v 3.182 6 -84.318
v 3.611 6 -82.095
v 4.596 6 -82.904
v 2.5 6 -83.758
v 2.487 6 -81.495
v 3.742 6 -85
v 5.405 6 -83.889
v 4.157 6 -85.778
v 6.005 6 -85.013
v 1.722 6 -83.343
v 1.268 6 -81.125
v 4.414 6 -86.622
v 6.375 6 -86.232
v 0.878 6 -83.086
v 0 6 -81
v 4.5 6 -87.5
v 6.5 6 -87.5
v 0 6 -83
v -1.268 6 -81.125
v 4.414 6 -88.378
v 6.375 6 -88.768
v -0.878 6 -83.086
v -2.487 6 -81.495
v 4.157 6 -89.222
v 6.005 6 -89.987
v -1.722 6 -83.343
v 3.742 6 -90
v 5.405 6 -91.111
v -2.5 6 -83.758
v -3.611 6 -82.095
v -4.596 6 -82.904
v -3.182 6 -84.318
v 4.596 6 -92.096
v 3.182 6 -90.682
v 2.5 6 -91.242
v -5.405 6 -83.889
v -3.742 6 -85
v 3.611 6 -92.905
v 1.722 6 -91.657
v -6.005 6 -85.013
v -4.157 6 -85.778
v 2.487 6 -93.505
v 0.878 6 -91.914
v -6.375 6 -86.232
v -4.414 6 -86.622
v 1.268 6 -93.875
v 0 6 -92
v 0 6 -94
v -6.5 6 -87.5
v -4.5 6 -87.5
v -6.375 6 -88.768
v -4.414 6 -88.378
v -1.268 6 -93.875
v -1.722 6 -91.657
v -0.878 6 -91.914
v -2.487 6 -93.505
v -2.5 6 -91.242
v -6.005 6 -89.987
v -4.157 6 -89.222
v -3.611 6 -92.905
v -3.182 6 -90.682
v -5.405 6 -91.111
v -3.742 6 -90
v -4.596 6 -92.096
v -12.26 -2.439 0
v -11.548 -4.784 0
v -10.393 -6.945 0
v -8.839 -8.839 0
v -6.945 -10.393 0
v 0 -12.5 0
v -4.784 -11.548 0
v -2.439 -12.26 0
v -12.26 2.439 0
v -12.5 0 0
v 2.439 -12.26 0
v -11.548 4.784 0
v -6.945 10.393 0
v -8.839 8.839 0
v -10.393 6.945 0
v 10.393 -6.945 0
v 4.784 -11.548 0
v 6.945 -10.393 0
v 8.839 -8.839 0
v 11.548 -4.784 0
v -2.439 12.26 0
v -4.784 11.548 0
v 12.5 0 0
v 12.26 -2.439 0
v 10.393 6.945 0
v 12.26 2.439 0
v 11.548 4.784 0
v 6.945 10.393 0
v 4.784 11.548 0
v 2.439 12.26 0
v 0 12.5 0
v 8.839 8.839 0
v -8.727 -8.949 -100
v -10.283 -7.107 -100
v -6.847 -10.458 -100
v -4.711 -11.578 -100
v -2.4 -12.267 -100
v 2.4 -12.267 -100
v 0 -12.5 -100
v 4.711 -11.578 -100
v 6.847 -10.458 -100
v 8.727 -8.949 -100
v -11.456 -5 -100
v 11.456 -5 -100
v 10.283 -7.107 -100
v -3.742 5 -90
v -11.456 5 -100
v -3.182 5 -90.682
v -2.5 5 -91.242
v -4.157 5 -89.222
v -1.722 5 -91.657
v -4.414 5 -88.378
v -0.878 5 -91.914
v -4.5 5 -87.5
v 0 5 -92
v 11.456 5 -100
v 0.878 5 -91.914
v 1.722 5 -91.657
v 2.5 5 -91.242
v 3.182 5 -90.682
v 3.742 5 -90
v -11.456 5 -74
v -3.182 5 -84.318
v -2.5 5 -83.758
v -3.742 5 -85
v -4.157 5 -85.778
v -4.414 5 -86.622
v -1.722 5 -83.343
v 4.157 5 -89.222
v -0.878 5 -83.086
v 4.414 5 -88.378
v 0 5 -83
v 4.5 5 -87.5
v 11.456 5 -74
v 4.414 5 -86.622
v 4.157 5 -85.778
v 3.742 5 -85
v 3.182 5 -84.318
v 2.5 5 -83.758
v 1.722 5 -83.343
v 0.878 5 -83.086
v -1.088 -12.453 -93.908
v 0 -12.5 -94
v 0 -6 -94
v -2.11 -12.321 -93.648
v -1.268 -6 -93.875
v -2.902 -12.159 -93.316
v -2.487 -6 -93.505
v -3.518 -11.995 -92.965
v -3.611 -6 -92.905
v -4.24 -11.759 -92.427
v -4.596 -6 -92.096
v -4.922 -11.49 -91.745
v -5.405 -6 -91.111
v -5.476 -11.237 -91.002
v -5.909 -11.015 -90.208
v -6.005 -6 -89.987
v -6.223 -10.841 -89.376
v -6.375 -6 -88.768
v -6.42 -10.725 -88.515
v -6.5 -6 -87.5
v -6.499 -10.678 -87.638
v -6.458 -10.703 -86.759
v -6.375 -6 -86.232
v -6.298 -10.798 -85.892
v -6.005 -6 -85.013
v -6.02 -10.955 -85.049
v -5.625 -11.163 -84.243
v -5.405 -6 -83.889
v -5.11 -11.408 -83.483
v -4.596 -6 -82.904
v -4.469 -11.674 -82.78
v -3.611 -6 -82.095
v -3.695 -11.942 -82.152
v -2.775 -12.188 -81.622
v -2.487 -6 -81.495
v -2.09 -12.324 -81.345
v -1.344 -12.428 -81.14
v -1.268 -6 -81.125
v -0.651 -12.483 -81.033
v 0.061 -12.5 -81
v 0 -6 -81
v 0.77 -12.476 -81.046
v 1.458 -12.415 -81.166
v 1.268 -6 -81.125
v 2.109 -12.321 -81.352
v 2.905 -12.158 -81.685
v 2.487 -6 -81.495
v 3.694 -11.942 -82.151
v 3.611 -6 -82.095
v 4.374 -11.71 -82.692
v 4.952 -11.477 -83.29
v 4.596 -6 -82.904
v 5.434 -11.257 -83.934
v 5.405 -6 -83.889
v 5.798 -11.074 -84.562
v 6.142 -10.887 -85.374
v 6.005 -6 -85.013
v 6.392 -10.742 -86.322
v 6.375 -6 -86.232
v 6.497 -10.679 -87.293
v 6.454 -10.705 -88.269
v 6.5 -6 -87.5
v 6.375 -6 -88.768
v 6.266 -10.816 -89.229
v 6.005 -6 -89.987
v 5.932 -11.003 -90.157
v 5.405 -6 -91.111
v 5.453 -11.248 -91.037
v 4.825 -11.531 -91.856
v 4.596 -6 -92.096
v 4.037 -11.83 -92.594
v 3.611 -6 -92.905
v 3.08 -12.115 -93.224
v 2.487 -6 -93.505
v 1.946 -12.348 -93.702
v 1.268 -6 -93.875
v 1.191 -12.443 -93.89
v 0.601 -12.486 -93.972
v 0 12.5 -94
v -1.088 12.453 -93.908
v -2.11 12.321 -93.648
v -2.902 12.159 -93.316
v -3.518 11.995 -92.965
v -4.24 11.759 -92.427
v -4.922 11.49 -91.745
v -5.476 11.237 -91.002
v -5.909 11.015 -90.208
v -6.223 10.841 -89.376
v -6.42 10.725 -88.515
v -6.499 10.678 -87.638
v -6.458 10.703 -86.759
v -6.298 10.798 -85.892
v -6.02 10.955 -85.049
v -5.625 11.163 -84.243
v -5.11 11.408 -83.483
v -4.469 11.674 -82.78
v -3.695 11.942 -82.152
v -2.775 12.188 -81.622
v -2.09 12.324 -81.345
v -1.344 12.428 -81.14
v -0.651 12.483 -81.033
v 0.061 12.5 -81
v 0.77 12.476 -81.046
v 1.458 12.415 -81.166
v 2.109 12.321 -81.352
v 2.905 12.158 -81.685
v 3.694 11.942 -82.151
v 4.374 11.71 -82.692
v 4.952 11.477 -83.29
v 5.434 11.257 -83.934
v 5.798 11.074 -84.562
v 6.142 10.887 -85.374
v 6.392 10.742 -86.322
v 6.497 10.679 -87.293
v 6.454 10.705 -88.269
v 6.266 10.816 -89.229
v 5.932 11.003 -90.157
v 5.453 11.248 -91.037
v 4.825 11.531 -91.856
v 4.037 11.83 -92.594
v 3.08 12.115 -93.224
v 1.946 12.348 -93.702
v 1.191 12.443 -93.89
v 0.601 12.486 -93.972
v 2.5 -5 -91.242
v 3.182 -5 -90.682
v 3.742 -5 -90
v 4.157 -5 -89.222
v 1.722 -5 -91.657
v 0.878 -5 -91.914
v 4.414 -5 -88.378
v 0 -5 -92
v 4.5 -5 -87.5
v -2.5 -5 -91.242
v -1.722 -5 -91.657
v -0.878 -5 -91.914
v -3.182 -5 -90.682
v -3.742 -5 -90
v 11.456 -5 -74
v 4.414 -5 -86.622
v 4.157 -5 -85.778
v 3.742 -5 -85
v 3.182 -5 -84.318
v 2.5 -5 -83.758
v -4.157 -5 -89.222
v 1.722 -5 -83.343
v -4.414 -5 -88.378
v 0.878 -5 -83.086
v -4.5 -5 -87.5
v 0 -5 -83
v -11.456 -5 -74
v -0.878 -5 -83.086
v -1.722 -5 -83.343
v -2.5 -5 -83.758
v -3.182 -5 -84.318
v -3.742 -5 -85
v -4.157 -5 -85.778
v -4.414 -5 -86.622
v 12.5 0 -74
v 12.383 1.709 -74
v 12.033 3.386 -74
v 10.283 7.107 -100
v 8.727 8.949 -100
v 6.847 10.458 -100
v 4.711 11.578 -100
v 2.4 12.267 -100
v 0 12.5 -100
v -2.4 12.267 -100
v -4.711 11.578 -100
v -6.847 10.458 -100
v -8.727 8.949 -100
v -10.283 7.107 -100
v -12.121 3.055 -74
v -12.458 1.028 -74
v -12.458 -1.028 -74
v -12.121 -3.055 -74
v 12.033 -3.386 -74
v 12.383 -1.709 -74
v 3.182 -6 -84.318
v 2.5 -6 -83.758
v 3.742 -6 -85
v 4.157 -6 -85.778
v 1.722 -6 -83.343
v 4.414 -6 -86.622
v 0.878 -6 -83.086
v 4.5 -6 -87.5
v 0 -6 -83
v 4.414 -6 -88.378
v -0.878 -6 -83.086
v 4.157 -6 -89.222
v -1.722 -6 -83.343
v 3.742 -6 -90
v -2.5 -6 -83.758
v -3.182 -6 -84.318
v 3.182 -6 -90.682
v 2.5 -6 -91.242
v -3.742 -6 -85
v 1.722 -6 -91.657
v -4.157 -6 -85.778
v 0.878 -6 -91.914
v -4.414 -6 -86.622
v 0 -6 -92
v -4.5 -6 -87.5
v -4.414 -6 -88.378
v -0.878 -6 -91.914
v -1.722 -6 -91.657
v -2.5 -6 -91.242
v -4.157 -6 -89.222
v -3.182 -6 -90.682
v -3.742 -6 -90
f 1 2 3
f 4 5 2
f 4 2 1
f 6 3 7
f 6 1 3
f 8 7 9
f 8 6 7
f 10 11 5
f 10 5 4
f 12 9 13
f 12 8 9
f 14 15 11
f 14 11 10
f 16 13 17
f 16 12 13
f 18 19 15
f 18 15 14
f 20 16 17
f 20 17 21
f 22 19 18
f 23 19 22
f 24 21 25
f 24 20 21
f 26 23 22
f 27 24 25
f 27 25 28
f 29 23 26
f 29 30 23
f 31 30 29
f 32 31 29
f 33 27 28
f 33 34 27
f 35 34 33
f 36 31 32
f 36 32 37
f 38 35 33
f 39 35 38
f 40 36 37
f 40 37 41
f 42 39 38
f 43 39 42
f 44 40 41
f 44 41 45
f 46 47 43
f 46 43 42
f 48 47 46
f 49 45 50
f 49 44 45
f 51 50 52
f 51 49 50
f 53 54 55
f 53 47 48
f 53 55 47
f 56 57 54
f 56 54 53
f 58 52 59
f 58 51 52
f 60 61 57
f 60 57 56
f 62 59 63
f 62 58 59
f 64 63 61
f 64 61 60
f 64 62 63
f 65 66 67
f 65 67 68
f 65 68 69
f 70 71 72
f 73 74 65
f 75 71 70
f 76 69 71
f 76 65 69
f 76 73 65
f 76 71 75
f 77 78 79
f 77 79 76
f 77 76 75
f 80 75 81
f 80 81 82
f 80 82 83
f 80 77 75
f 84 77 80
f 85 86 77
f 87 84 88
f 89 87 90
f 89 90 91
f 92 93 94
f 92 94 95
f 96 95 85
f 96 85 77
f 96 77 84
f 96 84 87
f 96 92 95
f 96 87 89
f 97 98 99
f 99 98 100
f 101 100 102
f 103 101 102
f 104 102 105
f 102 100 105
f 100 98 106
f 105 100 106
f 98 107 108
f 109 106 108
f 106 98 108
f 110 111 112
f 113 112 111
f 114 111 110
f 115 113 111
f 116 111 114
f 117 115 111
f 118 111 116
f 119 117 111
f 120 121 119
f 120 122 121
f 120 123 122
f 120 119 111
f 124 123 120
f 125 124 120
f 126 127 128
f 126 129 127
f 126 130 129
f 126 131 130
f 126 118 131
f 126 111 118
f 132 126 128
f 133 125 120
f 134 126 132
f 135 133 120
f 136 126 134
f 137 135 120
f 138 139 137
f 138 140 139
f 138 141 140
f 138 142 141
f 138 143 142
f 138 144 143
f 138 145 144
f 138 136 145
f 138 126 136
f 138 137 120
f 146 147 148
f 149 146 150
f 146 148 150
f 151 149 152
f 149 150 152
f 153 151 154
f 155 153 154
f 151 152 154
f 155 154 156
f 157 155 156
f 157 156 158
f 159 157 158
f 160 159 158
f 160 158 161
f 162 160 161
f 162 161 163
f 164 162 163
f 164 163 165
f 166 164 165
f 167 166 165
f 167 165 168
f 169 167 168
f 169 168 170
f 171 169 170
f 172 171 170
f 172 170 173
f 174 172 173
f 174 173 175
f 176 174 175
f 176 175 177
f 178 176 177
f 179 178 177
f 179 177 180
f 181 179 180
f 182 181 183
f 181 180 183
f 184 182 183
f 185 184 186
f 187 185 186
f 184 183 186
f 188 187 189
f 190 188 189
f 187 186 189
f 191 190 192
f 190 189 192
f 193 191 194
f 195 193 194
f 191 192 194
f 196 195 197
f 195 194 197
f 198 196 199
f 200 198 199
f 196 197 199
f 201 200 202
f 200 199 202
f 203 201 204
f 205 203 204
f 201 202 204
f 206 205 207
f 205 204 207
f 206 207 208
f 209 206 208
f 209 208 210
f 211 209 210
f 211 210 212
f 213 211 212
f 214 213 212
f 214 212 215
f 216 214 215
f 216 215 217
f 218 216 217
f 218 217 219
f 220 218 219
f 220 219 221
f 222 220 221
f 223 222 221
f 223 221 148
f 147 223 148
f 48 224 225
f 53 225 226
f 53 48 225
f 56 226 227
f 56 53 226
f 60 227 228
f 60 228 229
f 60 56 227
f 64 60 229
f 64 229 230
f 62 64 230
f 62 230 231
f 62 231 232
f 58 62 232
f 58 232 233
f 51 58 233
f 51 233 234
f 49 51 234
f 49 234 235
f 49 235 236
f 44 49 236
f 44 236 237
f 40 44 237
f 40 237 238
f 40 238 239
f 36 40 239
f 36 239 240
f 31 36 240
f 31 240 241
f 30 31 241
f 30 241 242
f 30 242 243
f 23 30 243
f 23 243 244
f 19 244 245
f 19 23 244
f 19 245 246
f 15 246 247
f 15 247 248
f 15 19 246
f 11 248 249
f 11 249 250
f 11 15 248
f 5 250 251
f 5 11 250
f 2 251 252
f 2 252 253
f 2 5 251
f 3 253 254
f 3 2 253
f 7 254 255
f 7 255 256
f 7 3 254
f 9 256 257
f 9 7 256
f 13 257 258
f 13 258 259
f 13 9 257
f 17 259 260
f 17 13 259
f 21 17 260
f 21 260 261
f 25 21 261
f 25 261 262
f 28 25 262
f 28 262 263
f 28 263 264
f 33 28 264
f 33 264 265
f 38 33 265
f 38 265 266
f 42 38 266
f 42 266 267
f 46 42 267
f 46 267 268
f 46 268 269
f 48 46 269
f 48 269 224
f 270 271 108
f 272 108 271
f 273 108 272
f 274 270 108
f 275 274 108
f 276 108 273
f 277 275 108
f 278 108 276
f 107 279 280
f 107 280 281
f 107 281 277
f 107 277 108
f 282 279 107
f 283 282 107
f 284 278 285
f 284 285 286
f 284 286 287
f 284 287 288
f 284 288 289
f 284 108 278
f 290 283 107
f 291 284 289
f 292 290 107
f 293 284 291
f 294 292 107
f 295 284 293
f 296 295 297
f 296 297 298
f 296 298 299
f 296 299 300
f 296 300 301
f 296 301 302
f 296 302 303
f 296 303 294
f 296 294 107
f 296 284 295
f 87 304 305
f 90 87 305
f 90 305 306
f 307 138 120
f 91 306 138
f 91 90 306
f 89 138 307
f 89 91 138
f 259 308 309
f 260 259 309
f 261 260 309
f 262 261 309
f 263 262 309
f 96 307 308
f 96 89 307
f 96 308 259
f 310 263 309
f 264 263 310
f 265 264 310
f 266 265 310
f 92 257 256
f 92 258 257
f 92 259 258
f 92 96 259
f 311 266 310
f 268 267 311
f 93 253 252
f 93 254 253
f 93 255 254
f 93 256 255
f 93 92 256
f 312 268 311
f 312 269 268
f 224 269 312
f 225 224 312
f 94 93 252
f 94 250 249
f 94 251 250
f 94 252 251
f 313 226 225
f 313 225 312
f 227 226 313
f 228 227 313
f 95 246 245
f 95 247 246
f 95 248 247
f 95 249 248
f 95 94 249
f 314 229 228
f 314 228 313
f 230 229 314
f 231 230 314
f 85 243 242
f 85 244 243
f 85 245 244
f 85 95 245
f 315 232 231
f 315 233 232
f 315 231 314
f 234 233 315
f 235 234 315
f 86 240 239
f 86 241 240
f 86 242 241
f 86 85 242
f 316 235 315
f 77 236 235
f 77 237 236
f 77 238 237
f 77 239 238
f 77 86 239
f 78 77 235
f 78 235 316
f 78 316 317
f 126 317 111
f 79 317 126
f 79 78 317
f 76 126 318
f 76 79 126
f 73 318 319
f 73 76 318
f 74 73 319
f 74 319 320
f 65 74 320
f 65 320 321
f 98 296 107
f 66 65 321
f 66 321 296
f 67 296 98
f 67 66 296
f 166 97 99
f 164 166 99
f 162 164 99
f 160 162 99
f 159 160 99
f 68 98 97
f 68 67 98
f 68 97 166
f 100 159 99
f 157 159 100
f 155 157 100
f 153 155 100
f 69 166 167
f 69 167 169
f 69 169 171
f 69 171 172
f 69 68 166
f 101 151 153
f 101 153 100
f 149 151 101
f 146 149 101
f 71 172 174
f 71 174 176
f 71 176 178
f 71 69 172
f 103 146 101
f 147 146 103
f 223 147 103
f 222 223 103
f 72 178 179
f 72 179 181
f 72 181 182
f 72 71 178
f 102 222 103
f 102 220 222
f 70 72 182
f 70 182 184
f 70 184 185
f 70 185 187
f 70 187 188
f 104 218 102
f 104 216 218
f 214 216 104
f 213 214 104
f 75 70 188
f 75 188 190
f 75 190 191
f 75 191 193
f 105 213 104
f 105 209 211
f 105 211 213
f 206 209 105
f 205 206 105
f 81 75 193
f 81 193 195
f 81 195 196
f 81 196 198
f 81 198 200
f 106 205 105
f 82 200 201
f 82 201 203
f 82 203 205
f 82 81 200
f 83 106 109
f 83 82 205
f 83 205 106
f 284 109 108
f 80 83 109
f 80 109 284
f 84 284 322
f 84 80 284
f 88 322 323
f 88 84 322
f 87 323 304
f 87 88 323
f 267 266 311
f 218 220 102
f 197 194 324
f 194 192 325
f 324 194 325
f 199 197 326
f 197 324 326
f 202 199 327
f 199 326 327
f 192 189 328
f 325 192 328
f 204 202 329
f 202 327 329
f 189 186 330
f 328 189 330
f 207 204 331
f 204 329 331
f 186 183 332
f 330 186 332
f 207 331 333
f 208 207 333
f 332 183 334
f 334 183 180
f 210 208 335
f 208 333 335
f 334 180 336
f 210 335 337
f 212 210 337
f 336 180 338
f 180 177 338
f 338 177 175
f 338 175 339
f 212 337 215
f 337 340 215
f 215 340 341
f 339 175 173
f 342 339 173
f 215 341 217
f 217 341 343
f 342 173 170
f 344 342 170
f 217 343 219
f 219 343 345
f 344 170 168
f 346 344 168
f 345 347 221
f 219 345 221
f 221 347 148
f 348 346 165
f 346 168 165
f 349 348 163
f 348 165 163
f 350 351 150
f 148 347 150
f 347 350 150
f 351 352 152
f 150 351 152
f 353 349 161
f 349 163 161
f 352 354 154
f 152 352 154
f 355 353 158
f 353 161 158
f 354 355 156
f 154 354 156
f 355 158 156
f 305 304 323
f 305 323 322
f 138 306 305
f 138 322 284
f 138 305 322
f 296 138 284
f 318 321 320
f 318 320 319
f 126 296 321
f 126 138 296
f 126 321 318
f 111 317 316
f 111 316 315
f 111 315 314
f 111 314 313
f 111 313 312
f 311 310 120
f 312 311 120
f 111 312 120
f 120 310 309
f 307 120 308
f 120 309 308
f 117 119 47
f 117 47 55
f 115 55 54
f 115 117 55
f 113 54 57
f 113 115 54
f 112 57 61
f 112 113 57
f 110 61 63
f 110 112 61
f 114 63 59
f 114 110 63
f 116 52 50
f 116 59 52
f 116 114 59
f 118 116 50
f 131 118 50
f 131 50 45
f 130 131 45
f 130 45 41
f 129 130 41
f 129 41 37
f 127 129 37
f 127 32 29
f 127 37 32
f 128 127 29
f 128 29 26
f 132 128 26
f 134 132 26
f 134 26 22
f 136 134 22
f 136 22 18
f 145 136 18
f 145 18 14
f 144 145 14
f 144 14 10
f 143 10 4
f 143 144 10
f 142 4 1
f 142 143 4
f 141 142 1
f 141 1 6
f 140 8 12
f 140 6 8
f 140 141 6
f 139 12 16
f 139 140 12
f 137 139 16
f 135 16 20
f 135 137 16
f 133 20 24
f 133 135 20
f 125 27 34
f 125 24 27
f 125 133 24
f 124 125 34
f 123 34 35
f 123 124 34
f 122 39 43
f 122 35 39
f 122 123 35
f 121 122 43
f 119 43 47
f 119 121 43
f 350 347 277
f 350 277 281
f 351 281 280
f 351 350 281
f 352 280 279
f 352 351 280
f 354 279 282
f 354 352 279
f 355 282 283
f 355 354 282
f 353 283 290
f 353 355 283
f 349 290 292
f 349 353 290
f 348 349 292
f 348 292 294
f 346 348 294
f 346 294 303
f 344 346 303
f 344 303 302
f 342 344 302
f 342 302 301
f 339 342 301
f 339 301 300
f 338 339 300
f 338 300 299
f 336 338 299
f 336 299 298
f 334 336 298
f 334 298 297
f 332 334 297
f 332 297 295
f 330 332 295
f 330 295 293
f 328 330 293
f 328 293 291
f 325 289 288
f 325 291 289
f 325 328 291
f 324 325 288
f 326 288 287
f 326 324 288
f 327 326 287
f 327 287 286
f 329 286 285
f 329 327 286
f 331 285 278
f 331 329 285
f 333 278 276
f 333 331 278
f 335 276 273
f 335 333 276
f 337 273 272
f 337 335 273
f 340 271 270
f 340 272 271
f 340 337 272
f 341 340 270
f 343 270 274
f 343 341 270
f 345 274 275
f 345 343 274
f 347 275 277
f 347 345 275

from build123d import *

# Parameters (mm, degrees)
SKETCH_1_R               = 12.5
EXTRUDE_1_DEPTH          = 100
CUT_EXTRUDE_START        = -26
CUT_EXTRUDE_1_DEPTH      = 26
CUT_EXTRUDE_2_DEPTH      = 34
CUT_EXTRUDE_2_DEPTH_BACK = 36.534771414
SKETCH_3_R               = 4.5
SKETCH_6_R               = 6.5
CUT_EXTRUDE_5_DEPTH      = 16


with BuildPart() as part:
    # 스케치1 → 보스-돌출1 (new body)
    with BuildSketch(Plane.XY):
        Circle(SKETCH_1_R)
    extrude(amount=-EXTRUDE_1_DEPTH)

    # 스케치2 → 컷-돌출1 (cut)
    with BuildSketch(Plane(origin=(0, 0, -100), x_dir=(-1, 0, 0), z_dir=(0, 0, -1)).offset(CUT_EXTRUDE_START)):
        with BuildLine():
            Line((11.456439237, 5), (-11.456439237, 5))
            ThreePointArc((-11.456439237, 5), (-12.5, 0), (-11.456439237, -5))
            Line((-11.456439237, -5), (11.456439237, -5))
            ThreePointArc((11.456439237, -5), (12.5, 0), (11.456439237, 5))
        make_face()
    extrude(amount=CUT_EXTRUDE_1_DEPTH, mode=Mode.SUBTRACT)

    # 스케치3 → 컷-돌출2 (cut, two sides: drawn at the far end of the back side and taken through both)
    with BuildSketch(Plane(origin=(0, 0, 0), x_dir=(1, 0, 0), z_dir=(0, 1, 0)).offset(-CUT_EXTRUDE_2_DEPTH_BACK)):
        with Locations(Location((0, 87.5, 0), (0, 0, 90))):
            Circle(SKETCH_3_R)
    extrude(amount=CUT_EXTRUDE_2_DEPTH + CUT_EXTRUDE_2_DEPTH_BACK, mode=Mode.SUBTRACT)

    # 스케치6 → 컷-돌출5 (cut)
    with BuildSketch(Plane(origin=(0, 6, 0), x_dir=(1, 0, 0), z_dir=(0, 1, 0))):
        with Locations(Location((0, 87.5, 0), (0, 0, 90))):
            Circle(SKETCH_6_R)
    cut_extrude_5 = extrude(amount=CUT_EXTRUDE_5_DEPTH, mode=Mode.SUBTRACT)

    # 대칭 복사1: 컷-돌출5 across plane
    add(cut_extrude_5.mirror(Plane.ZX), mode=Mode.SUBTRACT)


solid = part.part
